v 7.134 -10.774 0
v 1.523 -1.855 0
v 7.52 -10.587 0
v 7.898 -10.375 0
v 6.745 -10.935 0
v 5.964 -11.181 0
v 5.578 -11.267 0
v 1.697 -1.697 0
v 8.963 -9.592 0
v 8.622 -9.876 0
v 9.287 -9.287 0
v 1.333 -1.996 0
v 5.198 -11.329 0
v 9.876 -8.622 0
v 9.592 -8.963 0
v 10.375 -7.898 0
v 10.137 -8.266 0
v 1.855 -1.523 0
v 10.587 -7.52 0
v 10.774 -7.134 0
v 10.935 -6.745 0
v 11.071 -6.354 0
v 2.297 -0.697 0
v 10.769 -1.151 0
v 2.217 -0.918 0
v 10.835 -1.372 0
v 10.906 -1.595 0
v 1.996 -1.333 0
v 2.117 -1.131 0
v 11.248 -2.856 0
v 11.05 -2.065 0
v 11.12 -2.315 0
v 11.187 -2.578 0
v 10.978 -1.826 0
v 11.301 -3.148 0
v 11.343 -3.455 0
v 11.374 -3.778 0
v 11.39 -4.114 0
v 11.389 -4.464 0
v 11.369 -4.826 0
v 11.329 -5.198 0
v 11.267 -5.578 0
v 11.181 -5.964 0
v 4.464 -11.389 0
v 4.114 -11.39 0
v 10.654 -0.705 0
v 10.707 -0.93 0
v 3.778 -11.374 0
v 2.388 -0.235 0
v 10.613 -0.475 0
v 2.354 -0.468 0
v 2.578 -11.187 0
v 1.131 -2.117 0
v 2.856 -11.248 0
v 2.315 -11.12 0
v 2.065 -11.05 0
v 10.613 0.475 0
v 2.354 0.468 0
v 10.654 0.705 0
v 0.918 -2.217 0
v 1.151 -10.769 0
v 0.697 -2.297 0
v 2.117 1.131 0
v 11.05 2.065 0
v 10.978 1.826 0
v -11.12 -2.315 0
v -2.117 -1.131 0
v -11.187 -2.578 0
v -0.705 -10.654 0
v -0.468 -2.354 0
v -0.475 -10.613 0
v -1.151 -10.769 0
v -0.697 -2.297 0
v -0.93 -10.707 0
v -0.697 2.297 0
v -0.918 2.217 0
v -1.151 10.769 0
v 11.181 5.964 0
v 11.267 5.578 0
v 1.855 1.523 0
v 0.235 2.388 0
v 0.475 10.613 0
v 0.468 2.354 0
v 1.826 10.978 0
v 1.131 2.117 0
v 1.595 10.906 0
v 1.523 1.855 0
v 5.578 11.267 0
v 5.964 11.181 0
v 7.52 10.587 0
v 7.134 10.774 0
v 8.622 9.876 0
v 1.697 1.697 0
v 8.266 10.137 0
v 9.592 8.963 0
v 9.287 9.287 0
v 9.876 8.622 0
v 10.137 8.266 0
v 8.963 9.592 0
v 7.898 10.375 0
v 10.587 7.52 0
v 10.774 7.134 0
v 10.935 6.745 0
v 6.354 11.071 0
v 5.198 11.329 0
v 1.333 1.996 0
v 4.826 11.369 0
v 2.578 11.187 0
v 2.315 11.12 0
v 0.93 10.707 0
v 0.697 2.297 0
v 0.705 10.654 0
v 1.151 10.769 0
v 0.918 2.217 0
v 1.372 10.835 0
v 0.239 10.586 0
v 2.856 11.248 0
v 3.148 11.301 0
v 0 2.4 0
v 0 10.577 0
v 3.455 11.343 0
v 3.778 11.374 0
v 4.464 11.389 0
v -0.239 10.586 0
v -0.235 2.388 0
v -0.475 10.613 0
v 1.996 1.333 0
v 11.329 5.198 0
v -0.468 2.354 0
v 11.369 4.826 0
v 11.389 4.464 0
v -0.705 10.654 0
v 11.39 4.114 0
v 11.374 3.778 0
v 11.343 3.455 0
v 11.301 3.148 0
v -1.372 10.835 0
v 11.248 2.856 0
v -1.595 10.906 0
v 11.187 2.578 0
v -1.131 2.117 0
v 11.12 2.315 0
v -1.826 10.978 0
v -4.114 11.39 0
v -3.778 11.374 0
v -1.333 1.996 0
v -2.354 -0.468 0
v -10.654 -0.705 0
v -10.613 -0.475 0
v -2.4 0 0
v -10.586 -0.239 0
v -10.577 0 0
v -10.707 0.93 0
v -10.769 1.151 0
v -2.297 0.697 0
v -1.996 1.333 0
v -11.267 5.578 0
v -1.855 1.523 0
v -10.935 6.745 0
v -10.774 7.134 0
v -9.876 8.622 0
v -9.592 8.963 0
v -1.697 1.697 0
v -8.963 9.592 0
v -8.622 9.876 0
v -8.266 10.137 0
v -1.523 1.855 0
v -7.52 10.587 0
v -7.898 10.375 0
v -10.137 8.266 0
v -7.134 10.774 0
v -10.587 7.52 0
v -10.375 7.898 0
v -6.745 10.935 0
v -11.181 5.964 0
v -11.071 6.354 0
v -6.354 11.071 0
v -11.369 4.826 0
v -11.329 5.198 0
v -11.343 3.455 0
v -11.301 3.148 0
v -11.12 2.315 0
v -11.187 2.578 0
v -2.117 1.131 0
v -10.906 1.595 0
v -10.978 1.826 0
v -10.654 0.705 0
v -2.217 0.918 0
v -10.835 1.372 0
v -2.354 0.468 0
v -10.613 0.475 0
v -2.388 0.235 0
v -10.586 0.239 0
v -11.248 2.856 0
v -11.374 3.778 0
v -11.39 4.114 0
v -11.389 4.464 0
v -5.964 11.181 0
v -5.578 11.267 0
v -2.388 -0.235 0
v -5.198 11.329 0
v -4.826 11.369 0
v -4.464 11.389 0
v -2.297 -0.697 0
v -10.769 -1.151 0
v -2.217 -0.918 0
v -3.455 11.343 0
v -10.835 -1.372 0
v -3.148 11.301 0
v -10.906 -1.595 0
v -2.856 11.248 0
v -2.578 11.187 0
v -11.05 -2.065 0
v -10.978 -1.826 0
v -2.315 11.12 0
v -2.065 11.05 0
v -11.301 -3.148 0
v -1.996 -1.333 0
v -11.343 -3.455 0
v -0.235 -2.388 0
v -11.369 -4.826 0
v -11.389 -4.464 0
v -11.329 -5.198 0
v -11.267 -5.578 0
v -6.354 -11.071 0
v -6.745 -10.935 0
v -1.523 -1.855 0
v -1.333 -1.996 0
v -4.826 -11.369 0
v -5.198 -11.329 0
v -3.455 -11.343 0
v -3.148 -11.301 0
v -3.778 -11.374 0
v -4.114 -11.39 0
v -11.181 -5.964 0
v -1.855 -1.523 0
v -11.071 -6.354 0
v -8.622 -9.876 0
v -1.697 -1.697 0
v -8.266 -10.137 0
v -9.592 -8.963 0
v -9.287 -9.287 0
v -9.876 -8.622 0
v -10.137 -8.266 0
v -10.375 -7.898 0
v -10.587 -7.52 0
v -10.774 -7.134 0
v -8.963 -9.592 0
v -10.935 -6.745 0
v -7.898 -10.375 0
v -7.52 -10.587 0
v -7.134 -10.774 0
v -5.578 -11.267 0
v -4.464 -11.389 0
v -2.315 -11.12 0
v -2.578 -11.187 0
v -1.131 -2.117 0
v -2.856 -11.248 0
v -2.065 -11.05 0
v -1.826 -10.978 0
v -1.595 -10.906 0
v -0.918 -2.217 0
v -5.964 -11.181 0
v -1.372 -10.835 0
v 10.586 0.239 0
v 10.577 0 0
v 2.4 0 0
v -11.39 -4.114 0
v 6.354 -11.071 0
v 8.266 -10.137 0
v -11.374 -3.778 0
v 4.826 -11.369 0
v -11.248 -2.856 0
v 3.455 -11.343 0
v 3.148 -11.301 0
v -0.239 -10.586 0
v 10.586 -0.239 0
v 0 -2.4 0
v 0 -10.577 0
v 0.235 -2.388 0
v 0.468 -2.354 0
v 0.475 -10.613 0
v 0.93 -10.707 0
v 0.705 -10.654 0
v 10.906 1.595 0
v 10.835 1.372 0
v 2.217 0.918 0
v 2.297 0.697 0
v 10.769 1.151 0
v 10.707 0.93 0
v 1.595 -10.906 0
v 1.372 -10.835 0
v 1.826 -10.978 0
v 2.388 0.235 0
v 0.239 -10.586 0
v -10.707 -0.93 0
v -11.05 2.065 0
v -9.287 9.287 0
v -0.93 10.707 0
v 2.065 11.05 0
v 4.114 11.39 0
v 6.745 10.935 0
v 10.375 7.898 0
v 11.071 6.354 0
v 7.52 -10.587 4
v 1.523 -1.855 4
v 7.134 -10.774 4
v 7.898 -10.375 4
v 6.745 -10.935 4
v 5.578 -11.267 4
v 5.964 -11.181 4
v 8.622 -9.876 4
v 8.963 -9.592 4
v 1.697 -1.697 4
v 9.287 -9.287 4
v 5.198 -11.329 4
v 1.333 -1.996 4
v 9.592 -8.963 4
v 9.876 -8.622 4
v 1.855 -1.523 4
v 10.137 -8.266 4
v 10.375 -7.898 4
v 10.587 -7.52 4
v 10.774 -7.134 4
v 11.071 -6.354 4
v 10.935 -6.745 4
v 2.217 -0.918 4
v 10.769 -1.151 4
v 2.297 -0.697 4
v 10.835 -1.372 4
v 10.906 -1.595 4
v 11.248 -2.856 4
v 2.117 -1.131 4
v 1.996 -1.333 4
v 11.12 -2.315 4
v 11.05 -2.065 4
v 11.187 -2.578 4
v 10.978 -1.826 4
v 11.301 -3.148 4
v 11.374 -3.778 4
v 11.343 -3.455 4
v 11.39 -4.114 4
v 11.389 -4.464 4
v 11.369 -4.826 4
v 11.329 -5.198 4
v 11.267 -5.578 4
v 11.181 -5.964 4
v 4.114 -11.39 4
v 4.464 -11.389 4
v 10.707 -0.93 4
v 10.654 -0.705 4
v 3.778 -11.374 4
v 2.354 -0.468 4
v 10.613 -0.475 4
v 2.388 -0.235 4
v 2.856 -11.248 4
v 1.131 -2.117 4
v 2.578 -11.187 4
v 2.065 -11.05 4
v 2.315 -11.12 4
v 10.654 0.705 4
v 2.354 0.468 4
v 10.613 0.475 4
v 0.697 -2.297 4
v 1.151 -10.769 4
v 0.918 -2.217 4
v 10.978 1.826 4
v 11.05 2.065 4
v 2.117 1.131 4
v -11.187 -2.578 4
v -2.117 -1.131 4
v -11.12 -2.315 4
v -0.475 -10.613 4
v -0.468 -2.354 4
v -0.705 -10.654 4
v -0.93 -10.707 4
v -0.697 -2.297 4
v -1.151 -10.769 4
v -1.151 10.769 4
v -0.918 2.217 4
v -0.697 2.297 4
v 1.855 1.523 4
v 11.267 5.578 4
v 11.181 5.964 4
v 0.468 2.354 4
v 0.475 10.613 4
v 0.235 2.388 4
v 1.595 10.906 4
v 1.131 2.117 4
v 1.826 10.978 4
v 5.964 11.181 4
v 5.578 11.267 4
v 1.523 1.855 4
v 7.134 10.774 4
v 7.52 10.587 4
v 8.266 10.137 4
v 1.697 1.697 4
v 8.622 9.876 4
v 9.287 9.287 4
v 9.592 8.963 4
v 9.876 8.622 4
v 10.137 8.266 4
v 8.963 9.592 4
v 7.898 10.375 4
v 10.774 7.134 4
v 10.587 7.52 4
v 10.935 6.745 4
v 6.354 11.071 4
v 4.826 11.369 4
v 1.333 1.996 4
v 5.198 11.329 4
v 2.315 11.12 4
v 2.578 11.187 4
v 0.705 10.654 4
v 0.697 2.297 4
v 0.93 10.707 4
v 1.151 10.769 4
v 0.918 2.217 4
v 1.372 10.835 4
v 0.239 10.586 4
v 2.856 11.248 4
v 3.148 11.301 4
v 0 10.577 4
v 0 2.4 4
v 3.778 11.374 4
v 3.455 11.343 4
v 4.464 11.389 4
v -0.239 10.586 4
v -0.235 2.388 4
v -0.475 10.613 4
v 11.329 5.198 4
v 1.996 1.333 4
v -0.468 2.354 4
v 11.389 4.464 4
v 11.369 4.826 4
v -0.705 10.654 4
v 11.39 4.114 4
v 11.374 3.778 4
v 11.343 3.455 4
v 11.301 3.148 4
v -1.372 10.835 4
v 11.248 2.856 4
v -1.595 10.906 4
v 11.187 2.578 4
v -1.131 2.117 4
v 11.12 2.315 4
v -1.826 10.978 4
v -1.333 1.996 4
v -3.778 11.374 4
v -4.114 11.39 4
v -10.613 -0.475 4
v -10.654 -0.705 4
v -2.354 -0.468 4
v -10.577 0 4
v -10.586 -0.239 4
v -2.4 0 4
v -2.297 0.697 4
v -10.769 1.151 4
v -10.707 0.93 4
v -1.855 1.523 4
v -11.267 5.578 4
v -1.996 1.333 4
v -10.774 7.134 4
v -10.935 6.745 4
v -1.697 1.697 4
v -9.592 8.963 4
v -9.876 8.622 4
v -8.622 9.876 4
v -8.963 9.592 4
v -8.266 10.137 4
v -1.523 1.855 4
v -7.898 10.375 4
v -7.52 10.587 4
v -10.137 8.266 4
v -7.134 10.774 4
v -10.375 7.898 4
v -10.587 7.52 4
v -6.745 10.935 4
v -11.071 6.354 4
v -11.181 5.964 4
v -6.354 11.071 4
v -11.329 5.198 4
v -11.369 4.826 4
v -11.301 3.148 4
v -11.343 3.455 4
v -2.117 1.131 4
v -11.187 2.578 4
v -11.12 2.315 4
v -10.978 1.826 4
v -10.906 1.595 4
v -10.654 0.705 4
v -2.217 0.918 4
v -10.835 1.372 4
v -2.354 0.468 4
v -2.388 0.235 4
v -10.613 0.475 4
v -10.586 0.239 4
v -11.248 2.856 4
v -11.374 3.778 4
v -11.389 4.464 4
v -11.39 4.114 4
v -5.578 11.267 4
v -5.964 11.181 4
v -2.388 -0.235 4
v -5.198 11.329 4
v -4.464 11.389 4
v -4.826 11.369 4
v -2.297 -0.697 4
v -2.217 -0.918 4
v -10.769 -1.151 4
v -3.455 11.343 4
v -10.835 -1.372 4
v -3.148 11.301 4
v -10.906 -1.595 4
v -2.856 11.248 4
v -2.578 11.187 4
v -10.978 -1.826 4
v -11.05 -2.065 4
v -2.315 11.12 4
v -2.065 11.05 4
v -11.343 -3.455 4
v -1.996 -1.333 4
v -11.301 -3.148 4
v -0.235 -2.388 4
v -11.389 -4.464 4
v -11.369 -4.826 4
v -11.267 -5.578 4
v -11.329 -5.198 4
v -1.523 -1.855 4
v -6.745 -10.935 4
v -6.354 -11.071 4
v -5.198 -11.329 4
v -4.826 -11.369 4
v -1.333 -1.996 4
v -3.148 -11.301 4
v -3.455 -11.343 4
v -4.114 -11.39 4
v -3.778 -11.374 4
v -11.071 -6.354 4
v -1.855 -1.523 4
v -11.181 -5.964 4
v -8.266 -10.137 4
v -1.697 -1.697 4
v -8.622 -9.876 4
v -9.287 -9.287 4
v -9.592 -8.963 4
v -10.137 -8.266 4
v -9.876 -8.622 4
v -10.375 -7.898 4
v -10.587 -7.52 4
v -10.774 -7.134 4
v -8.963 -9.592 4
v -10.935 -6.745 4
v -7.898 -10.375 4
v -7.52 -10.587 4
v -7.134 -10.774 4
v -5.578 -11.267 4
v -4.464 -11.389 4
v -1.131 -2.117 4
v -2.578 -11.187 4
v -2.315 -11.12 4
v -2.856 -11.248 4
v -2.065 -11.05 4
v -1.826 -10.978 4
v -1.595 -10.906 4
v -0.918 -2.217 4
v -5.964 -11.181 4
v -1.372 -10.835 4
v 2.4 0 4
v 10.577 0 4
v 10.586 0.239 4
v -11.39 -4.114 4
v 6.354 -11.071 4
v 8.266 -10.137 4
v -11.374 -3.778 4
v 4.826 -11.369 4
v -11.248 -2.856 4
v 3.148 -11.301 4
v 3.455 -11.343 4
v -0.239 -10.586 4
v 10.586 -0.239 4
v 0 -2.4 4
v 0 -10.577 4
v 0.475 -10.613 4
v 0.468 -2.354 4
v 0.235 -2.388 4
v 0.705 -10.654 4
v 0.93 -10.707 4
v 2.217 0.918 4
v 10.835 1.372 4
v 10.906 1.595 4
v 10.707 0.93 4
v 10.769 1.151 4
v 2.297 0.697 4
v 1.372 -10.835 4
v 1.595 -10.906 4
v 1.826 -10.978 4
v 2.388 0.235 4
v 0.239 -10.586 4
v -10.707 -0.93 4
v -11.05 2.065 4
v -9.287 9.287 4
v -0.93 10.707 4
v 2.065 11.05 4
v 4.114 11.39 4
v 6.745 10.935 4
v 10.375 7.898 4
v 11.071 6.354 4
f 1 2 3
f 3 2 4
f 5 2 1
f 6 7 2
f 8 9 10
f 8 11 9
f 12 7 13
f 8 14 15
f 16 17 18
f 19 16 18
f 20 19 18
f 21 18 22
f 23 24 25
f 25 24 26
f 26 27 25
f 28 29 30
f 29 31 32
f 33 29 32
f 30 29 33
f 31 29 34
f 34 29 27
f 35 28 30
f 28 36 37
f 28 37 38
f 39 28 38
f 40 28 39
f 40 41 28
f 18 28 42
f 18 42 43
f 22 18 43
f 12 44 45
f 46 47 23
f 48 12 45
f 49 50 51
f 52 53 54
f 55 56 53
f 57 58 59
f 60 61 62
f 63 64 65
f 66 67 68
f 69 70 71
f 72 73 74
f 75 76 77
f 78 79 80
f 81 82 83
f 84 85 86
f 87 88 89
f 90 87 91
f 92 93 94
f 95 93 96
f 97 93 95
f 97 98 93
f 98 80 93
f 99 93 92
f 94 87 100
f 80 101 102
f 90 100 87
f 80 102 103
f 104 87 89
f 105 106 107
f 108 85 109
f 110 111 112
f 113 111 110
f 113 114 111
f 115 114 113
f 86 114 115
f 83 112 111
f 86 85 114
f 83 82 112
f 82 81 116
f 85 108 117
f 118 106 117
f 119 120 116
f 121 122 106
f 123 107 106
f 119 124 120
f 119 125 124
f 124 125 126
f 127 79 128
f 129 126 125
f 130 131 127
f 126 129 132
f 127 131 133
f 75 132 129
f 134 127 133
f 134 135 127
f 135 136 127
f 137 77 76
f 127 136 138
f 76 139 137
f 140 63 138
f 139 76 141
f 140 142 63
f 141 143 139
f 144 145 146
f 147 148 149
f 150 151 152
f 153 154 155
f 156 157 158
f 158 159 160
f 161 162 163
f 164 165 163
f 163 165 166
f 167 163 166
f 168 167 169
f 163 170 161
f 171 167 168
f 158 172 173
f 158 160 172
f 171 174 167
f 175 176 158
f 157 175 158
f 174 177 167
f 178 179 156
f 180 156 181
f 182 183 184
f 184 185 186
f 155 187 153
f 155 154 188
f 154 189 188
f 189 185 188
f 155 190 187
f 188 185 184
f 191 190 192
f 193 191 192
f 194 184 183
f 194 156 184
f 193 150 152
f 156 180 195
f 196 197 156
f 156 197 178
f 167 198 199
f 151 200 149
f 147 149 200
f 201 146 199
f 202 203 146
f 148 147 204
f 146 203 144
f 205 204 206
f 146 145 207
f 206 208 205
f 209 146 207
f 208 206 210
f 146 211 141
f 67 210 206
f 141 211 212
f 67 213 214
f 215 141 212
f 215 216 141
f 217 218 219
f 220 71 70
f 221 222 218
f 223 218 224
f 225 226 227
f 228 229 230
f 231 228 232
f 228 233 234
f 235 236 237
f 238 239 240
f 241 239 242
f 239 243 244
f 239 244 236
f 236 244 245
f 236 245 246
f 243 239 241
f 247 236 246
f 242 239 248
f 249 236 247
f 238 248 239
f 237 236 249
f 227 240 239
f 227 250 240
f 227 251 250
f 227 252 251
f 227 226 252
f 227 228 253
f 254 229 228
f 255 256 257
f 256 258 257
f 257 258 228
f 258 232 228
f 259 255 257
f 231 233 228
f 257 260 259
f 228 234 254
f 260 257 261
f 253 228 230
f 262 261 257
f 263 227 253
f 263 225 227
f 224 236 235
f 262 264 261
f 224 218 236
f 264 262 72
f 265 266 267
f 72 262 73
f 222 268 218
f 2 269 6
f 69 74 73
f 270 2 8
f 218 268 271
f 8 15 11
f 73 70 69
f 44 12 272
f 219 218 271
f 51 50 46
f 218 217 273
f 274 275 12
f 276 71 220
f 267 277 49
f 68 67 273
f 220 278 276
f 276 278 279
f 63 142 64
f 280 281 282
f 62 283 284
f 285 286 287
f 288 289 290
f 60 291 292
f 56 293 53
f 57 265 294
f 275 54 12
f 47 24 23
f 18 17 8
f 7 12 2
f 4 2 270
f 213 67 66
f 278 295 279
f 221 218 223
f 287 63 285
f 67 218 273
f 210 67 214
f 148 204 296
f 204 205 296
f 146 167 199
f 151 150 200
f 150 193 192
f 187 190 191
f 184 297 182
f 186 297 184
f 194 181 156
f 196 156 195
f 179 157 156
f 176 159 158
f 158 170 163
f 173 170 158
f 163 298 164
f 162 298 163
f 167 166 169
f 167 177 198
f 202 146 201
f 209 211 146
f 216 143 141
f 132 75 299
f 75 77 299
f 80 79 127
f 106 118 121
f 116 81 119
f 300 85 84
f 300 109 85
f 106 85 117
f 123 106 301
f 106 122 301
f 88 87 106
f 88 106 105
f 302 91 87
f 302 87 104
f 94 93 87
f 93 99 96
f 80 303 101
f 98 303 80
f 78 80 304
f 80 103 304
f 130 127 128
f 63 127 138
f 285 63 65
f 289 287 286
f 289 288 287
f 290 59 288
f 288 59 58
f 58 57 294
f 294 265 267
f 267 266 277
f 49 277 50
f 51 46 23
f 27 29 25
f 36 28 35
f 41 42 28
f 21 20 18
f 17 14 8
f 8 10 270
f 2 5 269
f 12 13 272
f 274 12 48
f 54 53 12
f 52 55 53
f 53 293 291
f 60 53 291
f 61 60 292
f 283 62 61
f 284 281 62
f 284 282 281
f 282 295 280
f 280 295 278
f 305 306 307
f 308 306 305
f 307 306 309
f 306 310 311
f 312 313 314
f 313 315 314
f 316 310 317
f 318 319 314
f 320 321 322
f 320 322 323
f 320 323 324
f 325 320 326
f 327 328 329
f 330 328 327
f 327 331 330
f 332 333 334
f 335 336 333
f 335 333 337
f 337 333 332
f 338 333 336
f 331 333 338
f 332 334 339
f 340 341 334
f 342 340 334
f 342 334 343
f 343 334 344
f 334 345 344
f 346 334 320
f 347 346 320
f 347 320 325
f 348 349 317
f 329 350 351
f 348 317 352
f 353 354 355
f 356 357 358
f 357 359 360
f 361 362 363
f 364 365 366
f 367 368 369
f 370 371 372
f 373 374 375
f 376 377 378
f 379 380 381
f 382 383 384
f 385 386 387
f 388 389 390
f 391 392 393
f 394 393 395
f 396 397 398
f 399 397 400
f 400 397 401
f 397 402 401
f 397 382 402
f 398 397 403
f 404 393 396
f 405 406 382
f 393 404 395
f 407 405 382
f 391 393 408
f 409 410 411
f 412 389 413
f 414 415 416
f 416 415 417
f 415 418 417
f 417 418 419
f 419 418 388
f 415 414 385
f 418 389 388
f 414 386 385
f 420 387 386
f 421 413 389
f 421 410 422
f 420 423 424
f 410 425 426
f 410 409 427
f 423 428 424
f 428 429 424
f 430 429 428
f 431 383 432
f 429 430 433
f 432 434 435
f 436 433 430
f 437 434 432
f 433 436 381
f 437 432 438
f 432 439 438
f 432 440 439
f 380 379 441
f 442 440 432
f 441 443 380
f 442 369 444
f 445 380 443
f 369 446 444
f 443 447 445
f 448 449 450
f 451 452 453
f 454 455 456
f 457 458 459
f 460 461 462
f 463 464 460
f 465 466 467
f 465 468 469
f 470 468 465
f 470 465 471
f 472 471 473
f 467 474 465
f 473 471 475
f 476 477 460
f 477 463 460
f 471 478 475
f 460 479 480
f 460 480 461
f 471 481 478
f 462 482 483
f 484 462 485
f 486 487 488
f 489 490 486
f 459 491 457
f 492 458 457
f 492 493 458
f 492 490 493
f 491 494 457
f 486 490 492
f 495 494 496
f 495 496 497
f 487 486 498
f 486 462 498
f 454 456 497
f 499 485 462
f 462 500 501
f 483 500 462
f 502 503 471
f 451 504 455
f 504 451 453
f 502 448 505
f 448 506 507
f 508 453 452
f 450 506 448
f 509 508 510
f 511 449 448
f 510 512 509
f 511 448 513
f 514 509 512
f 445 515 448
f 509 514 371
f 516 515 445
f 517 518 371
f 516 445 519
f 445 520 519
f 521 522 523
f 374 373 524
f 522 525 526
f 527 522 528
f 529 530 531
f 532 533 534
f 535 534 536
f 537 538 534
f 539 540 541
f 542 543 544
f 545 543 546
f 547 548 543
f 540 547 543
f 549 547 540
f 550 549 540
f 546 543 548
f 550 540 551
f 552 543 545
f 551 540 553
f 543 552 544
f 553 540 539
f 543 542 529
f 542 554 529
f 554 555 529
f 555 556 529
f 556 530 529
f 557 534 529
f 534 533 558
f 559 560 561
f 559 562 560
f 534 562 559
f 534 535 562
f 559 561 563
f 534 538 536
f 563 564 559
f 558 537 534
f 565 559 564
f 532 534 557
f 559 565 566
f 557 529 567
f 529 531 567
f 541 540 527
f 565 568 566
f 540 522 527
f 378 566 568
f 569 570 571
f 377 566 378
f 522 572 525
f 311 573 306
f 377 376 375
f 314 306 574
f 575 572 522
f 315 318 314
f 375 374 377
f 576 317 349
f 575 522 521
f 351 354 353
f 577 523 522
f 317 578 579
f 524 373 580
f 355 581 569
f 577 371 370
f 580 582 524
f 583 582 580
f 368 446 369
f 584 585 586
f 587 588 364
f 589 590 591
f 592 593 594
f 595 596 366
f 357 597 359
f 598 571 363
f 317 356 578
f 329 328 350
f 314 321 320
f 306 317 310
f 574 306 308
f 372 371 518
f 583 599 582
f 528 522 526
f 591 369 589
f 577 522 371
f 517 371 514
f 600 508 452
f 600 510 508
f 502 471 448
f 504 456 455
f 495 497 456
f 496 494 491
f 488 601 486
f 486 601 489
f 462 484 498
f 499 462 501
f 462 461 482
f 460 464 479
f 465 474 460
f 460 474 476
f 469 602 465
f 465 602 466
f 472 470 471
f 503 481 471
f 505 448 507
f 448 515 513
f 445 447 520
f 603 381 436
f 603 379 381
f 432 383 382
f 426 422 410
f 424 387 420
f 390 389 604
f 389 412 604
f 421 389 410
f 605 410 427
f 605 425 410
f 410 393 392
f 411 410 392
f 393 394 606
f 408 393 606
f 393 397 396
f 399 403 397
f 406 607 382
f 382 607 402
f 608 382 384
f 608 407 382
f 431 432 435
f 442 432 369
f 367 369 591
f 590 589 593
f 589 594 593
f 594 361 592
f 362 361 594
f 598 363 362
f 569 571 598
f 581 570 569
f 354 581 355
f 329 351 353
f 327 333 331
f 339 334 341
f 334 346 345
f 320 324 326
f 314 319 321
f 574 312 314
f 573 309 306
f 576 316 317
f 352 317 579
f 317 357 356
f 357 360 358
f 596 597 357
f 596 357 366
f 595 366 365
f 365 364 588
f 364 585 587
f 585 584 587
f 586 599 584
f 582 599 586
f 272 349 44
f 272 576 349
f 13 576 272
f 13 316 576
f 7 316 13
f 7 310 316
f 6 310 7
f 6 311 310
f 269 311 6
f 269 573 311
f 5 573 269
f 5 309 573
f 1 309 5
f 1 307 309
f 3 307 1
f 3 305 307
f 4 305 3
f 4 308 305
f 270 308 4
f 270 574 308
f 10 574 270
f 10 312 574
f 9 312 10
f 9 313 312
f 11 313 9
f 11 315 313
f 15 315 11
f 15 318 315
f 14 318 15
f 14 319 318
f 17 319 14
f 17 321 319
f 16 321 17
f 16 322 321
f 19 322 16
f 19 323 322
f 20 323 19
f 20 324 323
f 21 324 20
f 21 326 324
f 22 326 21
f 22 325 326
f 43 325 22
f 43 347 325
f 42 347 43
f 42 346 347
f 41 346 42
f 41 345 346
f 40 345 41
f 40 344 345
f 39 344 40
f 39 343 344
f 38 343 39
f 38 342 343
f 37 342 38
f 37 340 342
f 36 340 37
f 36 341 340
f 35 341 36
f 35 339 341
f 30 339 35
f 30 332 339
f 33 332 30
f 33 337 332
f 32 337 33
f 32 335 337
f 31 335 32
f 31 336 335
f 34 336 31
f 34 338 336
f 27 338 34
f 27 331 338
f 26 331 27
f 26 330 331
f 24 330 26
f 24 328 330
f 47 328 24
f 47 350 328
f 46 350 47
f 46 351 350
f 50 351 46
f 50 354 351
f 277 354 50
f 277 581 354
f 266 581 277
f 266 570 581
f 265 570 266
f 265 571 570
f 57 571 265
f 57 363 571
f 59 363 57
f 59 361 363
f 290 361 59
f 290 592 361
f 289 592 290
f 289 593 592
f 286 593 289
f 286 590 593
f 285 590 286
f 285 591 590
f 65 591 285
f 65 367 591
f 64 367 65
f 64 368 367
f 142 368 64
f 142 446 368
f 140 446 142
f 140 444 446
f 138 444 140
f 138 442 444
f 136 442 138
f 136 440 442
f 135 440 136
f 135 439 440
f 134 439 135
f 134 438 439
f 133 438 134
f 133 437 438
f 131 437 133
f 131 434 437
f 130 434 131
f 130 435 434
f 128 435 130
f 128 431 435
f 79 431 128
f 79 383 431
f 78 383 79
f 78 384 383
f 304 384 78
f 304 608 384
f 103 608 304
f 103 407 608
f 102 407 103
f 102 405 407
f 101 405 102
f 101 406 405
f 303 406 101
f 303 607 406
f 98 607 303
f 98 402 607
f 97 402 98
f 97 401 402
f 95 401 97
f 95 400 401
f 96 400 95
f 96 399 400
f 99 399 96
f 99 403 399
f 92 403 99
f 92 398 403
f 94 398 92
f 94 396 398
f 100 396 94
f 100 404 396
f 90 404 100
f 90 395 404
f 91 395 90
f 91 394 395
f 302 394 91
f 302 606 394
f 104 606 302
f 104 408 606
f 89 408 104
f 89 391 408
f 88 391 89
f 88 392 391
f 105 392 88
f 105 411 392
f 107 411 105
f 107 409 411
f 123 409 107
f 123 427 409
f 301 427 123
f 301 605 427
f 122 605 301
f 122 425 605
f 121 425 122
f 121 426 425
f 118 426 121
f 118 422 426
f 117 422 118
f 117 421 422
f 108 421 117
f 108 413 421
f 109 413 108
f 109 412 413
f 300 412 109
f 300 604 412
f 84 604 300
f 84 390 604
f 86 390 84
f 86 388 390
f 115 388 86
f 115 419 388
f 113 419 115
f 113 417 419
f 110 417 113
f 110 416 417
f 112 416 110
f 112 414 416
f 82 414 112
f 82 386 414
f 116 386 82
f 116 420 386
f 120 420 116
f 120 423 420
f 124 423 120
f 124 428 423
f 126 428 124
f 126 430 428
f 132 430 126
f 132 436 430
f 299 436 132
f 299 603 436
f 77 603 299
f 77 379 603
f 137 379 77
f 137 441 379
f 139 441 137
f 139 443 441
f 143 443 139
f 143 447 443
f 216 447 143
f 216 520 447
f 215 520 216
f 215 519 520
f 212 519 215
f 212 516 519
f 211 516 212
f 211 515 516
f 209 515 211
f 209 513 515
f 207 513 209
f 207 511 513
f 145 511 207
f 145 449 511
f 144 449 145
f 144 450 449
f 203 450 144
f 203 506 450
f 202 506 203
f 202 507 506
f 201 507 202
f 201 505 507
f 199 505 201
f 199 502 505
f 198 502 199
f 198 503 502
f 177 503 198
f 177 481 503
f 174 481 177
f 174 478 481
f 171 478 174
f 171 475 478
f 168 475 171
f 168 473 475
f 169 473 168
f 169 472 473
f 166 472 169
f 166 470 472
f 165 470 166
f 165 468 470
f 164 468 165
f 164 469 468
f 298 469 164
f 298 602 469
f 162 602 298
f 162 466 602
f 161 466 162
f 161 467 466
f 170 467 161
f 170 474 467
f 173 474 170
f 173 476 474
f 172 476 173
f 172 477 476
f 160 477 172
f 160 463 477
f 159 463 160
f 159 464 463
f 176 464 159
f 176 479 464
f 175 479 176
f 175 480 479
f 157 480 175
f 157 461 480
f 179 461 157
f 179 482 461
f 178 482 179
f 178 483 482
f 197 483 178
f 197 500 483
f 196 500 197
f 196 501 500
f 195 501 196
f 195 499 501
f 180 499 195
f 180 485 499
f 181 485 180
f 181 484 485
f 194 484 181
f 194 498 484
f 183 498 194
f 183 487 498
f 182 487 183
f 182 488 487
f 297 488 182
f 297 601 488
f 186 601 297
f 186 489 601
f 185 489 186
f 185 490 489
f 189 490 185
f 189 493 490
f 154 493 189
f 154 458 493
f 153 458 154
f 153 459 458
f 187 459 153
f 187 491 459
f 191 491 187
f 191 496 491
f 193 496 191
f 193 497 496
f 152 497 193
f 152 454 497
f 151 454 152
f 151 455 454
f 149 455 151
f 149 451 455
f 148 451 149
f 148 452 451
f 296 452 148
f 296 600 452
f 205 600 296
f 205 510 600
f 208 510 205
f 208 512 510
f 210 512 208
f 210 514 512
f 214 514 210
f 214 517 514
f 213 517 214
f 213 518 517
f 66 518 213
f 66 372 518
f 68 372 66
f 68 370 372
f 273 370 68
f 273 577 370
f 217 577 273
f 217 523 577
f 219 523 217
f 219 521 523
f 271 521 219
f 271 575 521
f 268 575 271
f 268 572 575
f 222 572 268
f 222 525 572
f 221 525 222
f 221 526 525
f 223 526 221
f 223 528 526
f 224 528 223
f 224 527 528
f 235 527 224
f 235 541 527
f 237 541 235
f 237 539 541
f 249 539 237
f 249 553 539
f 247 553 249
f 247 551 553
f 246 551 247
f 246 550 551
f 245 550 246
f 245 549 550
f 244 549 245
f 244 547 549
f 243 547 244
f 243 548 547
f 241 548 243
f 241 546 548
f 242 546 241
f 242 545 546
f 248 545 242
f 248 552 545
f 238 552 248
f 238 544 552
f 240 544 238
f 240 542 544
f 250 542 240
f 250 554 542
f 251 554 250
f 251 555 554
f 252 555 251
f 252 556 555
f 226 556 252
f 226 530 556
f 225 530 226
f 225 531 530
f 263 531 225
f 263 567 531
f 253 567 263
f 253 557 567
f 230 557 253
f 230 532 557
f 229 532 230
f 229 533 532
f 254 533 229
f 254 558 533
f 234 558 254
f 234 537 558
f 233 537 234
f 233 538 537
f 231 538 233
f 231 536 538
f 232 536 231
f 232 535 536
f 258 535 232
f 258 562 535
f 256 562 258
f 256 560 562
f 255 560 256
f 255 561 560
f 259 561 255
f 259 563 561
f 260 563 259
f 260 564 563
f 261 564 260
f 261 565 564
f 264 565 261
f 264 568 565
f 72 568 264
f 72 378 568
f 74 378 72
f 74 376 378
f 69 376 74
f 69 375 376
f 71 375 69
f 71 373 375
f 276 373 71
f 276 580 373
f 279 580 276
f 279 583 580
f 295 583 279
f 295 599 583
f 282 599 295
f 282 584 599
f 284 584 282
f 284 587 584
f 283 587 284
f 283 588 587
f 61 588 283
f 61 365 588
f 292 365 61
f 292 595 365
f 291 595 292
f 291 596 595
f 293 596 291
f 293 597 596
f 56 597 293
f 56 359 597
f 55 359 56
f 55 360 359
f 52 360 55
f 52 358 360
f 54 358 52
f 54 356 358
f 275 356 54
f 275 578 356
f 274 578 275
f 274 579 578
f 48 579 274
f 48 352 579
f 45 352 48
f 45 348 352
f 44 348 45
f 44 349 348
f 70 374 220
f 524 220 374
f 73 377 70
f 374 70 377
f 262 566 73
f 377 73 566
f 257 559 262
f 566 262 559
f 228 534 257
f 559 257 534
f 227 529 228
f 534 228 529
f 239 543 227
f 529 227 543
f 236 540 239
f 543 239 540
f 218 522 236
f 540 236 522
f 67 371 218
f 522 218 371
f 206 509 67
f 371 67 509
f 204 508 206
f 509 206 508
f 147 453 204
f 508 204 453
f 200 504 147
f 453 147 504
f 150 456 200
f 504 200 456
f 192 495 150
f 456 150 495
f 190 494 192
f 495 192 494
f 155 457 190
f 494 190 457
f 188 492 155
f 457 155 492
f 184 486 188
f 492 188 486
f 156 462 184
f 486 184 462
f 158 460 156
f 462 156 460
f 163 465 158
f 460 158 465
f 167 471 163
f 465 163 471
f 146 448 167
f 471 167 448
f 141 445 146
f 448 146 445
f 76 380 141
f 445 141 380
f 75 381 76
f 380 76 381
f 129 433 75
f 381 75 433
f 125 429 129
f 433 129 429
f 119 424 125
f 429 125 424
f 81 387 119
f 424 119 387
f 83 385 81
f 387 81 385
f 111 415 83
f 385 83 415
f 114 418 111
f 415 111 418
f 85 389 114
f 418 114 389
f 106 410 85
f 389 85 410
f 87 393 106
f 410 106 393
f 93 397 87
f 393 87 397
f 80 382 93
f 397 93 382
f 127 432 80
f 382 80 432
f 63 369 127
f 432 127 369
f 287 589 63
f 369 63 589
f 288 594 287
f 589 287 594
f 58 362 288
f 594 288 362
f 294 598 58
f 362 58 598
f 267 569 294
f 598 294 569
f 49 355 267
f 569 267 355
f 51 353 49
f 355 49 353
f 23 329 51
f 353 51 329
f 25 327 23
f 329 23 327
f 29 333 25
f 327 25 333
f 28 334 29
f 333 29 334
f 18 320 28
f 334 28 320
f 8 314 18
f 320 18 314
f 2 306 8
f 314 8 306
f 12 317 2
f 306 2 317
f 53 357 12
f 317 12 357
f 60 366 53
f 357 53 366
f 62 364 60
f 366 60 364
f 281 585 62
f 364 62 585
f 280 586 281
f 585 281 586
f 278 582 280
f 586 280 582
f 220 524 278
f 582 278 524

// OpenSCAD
/***
 * @function epitrochoid_curve_gear_body
 * @brief Render the Epitrochoid body before tooth placement.
 * Source: [`functions/epitrochoid/curve_gear_epitrochoid_body.scad`](functions/epitrochoid/curve_gear_epitrochoid_body.scad)
 * @image ../images/functions/epitrochoid/curve_gear_epitrochoid_body.png curve_gear_epitrochoid_body example preview
 * @image ../utils/doxydown-support/table-spacer.png ⠀
 */
use <curve_gear_epitrochoid.scad>;
_main_example_epitrochoid_view("body");
